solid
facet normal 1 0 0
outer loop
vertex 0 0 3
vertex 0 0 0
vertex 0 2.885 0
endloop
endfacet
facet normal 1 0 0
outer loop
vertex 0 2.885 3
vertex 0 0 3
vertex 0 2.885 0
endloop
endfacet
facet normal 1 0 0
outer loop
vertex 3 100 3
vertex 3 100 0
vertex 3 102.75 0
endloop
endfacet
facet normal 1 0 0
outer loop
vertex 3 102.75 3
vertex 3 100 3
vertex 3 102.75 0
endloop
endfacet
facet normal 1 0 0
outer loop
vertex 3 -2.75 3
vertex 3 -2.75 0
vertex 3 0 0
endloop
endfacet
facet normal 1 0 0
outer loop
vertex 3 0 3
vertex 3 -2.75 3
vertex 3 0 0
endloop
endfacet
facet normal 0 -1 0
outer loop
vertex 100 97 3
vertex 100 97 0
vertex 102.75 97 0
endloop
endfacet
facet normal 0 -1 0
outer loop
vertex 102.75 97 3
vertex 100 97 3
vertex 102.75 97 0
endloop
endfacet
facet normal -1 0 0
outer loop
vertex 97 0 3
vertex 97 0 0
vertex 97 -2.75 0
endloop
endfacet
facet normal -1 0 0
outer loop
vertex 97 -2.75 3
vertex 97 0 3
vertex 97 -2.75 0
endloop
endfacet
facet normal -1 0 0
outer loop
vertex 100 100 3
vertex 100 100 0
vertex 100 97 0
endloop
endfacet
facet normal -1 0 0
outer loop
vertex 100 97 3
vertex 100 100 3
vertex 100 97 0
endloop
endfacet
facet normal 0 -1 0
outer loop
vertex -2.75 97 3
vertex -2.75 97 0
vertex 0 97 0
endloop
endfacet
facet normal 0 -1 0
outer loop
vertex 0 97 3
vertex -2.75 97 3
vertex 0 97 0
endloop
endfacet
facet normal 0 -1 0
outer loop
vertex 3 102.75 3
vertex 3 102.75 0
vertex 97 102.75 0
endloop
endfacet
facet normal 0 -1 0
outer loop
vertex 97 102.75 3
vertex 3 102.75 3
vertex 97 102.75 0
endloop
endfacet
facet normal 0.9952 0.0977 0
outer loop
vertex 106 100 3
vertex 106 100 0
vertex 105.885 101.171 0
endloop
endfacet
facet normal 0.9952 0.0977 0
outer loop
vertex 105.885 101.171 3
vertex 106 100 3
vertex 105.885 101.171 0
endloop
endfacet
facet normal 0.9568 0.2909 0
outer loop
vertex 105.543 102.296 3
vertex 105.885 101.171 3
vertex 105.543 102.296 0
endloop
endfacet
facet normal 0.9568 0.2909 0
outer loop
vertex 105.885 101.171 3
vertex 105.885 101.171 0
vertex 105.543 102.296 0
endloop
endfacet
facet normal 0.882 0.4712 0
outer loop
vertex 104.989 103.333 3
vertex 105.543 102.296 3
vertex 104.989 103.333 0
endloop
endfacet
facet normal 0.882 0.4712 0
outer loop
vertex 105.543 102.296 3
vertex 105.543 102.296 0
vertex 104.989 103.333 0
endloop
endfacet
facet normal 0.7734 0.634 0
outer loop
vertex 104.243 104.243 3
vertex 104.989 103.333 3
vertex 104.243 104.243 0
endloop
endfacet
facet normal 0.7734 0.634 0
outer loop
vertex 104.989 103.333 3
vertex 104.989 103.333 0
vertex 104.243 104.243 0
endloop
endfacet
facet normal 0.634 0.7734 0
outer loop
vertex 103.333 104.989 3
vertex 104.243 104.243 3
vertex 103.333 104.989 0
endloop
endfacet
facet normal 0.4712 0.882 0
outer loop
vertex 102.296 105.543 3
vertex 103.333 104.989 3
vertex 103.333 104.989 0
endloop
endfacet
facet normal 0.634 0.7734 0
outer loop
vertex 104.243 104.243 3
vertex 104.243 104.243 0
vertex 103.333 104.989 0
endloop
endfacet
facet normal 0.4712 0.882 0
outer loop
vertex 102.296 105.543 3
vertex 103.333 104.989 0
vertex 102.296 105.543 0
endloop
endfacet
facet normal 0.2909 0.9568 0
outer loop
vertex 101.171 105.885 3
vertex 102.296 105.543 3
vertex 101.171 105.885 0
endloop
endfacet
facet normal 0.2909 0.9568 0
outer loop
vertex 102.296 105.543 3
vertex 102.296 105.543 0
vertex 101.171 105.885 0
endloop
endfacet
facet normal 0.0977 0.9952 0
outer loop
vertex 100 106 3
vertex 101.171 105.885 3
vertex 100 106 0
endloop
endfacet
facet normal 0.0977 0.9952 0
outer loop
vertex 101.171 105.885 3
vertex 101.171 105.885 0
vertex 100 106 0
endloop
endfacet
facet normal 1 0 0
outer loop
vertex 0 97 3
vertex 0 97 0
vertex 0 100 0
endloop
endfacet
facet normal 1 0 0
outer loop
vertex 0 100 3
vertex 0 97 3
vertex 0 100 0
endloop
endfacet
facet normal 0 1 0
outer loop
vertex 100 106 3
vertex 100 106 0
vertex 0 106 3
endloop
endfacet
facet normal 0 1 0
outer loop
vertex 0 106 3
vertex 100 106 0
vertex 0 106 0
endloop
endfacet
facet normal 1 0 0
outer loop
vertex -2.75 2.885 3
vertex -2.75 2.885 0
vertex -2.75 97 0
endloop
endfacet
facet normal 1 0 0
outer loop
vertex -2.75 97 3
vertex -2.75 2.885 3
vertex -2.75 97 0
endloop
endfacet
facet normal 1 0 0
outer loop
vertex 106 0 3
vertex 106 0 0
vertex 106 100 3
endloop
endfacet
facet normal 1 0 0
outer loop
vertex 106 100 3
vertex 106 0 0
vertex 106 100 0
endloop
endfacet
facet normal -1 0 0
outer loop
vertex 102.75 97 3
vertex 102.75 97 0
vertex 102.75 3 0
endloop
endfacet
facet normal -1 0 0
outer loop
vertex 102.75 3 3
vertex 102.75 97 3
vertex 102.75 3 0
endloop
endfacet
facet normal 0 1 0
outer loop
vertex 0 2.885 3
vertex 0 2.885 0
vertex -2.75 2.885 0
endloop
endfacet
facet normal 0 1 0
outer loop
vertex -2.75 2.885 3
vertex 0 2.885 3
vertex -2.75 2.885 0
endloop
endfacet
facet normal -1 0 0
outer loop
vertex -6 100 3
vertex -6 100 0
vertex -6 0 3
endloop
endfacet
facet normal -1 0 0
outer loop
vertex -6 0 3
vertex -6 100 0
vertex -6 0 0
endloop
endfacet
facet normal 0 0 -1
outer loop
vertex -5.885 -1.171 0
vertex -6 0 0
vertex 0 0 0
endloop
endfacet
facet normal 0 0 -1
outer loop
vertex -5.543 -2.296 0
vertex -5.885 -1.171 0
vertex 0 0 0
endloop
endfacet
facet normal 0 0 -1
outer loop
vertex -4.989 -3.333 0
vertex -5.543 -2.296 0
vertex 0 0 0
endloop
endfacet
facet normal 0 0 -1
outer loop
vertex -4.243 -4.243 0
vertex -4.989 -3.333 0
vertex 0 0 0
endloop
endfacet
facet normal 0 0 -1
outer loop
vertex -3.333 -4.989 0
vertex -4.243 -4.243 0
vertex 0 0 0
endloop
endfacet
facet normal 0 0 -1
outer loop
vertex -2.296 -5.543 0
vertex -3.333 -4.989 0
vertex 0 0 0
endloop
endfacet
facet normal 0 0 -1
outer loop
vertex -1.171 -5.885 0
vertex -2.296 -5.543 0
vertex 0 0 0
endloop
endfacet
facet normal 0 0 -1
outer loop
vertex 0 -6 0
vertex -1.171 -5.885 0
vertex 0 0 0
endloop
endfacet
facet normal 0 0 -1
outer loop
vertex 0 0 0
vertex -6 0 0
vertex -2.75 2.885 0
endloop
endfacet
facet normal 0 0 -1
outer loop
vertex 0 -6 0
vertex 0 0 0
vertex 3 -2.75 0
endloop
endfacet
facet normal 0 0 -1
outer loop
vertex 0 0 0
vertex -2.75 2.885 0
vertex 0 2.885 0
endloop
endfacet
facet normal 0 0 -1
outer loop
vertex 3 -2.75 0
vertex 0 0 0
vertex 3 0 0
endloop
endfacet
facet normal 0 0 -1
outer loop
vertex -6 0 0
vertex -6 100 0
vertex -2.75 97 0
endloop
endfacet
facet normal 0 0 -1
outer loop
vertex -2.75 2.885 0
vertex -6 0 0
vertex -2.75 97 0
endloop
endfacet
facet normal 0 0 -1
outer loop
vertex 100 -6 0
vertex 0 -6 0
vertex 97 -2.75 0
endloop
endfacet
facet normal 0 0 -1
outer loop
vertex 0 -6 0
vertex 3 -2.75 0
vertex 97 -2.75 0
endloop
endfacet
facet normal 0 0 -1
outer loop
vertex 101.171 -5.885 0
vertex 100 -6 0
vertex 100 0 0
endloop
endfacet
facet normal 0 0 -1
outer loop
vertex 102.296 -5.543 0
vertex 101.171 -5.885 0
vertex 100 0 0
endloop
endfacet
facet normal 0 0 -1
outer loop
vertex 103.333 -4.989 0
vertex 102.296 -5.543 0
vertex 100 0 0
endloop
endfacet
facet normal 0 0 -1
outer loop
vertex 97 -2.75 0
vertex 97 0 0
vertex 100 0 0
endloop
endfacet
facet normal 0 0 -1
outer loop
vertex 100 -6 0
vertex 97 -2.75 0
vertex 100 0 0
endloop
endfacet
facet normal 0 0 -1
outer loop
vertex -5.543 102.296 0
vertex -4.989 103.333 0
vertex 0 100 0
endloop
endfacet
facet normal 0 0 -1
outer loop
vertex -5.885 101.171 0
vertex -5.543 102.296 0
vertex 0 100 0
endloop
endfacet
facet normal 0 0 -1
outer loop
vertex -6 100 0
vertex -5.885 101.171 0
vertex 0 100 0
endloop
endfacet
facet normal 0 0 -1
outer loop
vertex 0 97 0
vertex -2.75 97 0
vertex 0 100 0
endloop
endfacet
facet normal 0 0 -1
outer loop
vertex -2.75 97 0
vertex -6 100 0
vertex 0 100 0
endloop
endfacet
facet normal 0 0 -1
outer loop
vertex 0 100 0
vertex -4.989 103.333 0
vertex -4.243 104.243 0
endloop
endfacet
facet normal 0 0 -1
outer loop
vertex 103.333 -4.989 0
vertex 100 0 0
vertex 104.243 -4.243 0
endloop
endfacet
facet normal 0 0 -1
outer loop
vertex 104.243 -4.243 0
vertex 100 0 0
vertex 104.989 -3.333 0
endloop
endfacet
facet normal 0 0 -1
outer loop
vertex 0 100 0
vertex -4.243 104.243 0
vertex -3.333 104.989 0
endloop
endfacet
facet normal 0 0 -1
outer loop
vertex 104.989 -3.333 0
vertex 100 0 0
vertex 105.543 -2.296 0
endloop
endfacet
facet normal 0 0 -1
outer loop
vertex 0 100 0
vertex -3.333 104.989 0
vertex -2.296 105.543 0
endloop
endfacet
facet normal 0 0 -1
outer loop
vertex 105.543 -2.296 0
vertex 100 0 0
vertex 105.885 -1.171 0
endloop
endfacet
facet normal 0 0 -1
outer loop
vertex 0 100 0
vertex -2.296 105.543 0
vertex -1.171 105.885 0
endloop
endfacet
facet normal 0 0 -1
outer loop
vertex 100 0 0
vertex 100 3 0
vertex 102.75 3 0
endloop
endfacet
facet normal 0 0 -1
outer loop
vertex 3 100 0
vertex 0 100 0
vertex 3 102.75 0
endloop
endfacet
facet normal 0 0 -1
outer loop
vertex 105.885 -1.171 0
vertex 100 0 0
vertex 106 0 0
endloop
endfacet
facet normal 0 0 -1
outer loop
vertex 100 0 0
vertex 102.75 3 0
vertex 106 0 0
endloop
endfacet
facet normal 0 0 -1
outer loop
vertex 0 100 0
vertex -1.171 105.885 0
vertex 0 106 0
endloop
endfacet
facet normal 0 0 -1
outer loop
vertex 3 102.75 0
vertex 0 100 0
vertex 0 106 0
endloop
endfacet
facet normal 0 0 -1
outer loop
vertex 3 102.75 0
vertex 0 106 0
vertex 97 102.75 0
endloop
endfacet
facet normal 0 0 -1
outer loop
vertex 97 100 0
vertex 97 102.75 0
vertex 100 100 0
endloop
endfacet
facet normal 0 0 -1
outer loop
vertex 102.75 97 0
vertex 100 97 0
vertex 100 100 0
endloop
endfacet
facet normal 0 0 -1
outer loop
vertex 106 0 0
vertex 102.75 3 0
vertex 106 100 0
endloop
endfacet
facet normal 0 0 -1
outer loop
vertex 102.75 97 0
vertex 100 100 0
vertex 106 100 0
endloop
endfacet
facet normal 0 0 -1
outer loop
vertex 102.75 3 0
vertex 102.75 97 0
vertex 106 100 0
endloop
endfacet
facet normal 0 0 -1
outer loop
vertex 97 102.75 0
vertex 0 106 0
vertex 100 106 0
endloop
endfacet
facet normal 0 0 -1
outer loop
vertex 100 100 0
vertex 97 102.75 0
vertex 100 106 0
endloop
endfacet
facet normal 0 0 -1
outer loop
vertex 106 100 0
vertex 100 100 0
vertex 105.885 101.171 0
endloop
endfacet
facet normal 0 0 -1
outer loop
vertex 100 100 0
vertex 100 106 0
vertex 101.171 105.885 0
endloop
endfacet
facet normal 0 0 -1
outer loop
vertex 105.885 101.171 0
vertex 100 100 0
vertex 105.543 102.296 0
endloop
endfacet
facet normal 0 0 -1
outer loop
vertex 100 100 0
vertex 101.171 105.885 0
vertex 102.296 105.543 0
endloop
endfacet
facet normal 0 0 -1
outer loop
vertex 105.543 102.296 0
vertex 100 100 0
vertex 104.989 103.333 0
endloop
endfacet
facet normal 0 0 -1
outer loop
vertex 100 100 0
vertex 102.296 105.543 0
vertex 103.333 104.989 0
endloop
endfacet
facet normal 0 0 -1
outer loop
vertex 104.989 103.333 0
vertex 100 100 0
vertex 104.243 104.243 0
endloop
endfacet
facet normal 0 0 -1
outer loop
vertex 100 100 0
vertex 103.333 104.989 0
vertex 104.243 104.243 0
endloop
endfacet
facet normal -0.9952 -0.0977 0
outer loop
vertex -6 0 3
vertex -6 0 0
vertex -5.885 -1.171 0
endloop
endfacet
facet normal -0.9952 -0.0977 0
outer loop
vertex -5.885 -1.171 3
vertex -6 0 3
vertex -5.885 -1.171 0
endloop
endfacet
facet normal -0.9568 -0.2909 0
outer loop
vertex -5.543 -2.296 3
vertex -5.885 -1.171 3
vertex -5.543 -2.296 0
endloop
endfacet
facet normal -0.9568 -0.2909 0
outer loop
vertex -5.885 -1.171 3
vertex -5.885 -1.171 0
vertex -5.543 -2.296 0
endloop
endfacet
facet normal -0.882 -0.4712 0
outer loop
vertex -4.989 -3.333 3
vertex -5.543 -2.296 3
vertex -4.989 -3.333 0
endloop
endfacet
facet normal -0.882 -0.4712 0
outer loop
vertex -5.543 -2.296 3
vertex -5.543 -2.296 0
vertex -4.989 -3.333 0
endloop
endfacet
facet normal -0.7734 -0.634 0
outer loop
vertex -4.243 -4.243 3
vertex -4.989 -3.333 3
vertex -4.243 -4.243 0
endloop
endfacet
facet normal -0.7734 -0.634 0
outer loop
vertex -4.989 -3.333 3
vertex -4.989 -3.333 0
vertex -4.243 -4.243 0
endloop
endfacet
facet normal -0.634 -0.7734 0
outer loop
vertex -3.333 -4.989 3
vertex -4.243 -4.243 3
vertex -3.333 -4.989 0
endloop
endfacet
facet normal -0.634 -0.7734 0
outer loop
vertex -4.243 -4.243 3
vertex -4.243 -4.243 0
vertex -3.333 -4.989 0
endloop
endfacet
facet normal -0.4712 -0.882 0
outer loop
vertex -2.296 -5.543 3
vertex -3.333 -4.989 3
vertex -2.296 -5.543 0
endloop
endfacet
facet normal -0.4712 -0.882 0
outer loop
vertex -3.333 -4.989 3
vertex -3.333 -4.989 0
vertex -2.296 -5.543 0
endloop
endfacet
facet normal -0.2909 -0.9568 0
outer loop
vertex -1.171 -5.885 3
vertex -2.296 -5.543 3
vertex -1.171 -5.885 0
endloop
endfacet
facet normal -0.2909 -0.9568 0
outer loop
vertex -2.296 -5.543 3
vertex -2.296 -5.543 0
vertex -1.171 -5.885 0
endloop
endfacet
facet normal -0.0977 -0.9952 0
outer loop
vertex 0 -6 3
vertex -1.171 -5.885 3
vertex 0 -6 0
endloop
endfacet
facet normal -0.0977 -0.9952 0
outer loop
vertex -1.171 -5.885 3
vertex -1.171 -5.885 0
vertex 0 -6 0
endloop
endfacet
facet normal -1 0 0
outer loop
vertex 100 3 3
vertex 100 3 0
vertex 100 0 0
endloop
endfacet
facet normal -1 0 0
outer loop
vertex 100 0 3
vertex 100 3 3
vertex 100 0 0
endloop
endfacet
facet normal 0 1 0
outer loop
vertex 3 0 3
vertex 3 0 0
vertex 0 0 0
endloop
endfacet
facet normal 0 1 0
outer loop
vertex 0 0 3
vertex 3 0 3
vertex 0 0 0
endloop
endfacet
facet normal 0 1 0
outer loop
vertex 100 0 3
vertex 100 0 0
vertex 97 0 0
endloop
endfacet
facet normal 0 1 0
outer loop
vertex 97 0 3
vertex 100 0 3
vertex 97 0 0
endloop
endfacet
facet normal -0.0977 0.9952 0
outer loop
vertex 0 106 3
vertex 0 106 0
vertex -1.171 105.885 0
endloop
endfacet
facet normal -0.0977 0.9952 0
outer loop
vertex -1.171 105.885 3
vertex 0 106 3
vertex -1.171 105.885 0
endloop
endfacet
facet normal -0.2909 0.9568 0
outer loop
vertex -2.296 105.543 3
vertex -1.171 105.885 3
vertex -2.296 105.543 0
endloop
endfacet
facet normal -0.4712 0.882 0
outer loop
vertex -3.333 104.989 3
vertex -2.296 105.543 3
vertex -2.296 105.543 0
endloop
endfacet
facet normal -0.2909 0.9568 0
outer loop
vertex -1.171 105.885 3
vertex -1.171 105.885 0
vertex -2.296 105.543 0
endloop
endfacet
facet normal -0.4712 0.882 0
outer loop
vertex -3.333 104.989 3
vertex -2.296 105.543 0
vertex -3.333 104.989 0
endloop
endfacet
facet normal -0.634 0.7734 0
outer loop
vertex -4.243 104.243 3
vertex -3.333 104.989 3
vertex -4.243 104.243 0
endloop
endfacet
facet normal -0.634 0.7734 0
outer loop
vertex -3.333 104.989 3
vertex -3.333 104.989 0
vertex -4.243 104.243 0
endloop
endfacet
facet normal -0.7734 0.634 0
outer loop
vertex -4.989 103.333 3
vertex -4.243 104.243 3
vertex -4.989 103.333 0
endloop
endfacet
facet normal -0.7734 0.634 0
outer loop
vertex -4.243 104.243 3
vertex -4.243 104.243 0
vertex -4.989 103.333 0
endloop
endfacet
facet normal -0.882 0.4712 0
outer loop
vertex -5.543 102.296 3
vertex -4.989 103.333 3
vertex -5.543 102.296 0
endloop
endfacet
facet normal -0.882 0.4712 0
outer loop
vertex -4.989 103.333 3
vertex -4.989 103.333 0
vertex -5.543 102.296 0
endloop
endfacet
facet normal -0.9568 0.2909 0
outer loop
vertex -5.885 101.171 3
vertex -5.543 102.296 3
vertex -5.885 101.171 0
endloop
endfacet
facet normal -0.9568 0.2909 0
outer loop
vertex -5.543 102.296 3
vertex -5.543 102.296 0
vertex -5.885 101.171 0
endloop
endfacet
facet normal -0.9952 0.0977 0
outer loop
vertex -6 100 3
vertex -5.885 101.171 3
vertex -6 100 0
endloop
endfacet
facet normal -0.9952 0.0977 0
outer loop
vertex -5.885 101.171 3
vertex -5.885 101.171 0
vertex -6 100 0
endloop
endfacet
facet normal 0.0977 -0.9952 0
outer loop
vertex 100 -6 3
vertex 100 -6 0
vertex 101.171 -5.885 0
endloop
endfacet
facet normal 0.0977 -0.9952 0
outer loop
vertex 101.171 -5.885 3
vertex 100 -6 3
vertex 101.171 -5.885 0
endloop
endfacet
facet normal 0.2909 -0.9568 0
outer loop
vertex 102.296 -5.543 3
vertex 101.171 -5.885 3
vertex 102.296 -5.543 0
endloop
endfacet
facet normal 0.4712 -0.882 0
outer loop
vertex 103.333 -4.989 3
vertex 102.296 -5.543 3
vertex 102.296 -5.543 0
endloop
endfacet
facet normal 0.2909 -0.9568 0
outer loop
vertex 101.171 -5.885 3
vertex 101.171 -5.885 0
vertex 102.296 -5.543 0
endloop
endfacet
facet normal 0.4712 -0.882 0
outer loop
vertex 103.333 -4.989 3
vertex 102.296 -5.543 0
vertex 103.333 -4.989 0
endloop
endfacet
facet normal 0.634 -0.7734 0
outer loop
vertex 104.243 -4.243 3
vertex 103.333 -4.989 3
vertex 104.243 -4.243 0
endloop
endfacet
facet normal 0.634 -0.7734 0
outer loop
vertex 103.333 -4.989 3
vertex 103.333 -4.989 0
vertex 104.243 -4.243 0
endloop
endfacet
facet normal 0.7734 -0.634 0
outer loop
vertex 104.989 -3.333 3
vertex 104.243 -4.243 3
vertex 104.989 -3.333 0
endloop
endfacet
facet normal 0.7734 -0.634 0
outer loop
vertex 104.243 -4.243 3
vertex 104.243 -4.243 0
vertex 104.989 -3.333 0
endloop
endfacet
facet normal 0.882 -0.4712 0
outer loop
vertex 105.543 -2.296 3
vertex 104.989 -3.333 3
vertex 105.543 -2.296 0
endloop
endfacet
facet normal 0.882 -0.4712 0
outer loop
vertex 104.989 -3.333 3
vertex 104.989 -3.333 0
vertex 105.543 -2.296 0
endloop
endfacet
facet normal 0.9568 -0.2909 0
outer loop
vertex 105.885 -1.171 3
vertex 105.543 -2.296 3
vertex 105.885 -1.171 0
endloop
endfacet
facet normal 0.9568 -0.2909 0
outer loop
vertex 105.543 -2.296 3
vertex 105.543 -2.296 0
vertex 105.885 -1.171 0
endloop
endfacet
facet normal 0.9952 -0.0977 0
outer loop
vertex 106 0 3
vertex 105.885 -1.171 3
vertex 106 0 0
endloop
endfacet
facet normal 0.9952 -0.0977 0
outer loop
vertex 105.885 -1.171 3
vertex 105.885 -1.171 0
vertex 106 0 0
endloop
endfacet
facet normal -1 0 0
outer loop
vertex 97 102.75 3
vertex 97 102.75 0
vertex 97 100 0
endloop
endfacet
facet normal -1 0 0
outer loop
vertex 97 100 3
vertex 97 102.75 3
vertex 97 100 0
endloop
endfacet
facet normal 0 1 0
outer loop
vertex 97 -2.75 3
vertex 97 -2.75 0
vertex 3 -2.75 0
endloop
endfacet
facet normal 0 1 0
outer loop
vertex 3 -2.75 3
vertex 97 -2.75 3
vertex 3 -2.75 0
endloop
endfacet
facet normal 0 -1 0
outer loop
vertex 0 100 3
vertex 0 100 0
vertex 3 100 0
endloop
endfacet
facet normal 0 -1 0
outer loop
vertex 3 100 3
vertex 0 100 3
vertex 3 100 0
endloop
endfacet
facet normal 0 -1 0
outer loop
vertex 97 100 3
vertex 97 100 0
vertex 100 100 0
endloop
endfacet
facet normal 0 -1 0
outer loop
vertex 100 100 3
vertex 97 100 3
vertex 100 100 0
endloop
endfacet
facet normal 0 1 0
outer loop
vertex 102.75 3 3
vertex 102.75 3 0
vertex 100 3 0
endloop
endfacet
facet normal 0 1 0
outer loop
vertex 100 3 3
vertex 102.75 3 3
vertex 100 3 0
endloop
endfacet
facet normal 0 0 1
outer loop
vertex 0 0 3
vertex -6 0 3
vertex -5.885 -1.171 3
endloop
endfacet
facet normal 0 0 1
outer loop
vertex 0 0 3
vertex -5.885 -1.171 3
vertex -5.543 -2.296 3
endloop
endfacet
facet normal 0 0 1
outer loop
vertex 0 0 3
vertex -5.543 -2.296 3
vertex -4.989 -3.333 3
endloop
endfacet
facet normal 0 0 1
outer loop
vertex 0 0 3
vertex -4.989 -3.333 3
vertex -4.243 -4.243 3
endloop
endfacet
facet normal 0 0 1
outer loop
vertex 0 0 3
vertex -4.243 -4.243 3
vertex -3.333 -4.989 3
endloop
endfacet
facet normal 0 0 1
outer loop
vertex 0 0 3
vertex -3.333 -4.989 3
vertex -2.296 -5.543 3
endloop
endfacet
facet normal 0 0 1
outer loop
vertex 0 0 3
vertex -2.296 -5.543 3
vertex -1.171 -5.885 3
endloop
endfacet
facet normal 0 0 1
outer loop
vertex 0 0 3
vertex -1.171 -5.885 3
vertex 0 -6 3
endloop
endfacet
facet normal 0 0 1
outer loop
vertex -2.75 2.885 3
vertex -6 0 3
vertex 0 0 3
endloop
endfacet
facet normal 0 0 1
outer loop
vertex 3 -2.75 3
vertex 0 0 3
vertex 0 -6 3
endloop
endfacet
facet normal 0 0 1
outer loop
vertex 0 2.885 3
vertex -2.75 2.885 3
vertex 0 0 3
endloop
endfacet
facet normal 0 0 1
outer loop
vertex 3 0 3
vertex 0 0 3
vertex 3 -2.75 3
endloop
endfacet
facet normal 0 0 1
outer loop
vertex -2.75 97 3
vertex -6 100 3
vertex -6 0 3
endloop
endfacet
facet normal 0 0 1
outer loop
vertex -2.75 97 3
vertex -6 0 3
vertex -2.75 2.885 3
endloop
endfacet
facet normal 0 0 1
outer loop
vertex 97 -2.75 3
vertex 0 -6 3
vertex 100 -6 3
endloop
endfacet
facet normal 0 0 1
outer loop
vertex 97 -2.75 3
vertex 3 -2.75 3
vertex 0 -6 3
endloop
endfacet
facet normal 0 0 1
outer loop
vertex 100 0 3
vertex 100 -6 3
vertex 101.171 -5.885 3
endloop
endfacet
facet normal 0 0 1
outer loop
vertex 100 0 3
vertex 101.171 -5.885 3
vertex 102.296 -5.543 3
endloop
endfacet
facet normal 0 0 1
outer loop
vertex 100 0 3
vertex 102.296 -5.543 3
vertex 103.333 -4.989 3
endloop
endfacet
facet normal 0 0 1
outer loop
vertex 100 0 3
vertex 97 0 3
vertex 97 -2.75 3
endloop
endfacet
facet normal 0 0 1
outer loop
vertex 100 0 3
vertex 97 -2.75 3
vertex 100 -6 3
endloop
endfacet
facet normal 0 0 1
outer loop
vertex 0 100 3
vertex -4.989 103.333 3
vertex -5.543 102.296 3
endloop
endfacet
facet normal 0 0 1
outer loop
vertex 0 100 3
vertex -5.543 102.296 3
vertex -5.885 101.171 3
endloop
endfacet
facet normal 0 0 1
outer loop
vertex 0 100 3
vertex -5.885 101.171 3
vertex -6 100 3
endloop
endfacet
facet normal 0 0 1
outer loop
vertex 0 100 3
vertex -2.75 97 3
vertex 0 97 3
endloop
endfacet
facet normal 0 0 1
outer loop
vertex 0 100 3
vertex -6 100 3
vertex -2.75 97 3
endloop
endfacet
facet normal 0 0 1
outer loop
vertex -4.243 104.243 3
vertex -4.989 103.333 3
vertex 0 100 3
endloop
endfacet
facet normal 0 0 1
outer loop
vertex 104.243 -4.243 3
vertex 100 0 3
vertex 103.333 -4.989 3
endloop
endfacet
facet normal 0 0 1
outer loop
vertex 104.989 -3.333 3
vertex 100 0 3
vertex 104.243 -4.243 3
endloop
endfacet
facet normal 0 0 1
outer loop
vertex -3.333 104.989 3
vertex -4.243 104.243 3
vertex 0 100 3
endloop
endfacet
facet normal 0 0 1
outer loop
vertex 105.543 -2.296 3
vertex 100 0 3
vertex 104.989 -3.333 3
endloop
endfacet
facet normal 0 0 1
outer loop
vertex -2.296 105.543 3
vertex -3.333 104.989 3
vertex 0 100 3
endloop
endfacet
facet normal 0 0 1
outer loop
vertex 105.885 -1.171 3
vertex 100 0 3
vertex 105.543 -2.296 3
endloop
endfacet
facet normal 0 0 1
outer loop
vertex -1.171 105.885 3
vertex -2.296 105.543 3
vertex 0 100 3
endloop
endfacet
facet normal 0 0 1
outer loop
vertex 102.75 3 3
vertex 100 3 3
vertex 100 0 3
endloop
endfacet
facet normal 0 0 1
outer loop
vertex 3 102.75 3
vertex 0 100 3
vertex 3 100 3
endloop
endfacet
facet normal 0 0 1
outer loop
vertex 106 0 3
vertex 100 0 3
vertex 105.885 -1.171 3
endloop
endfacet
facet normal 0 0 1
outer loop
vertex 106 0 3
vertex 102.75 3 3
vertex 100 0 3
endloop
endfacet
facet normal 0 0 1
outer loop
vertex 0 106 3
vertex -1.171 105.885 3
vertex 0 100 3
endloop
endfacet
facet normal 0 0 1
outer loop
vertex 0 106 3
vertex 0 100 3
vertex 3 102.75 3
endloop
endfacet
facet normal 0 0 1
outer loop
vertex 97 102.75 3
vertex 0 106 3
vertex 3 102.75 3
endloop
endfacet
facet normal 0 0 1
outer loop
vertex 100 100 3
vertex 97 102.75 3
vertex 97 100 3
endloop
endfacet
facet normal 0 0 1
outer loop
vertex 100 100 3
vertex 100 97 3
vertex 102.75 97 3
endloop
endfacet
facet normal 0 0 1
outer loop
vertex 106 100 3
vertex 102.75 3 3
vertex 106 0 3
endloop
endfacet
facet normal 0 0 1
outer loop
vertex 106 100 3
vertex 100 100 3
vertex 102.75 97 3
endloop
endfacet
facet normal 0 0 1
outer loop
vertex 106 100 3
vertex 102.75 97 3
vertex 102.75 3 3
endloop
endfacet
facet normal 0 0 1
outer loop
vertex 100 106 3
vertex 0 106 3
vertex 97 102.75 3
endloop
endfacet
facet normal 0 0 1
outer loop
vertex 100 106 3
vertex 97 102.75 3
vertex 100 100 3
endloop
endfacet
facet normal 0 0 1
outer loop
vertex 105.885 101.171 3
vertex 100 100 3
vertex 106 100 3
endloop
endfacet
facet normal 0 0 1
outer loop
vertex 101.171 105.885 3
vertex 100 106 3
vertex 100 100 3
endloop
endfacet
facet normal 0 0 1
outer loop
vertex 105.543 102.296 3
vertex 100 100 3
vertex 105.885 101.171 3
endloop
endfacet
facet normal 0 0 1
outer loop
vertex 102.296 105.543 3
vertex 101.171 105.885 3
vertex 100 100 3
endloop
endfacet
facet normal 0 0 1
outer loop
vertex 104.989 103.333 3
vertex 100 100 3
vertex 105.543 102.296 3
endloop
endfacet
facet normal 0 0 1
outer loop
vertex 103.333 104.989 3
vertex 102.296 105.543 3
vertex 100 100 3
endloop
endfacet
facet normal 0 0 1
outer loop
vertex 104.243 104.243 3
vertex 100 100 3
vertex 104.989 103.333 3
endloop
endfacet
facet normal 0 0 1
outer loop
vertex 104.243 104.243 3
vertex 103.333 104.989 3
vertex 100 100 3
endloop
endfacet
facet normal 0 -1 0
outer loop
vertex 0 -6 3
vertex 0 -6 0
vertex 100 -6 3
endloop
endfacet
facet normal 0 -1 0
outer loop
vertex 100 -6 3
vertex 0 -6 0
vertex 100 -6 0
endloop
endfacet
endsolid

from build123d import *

# Parameters (mm, degrees)
EXTRUDE_1_DEPTH = 3


with BuildPart() as part:
    # 草图1 → 凸台-拉伸1 (new body)
    with BuildSketch(Plane.XY):
        with BuildLine():
            ThreePointArc((-6, 0), (-4.242640687, -4.242640687), (0, -6))
            Line((0, -6), (100, -6))
            ThreePointArc((100, -6), (104.242640687, -4.242640687), (106, 0))
            Line((106, 0), (106, 100))
            ThreePointArc((106, 100), (104.242640687, 104.242640687), (100, 106))
            Line((100, 106), (0, 106))
            ThreePointArc((0, 106), (-4.242640687, 104.242640687), (-6, 100))
            Line((-6, 100), (-6, 0))
        make_face()
        Polygon((97, 0), (97, -2.75), (3, -2.75), (3, 0), (0, 0), (0, 2.885491928), (-2.75, 2.885491928), (-2.75, 3.015491928), (-2.75, 97), (0, 97), (0, 100), (3, 100), (3, 102.75), (97, 102.75), (97, 100), (100, 100), (100, 97), (102.75, 97), (102.75, 3), (100, 3), (100, 0), align=None, mode=Mode.SUBTRACT)
    extrude(amount=EXTRUDE_1_DEPTH)


solid = part.part
